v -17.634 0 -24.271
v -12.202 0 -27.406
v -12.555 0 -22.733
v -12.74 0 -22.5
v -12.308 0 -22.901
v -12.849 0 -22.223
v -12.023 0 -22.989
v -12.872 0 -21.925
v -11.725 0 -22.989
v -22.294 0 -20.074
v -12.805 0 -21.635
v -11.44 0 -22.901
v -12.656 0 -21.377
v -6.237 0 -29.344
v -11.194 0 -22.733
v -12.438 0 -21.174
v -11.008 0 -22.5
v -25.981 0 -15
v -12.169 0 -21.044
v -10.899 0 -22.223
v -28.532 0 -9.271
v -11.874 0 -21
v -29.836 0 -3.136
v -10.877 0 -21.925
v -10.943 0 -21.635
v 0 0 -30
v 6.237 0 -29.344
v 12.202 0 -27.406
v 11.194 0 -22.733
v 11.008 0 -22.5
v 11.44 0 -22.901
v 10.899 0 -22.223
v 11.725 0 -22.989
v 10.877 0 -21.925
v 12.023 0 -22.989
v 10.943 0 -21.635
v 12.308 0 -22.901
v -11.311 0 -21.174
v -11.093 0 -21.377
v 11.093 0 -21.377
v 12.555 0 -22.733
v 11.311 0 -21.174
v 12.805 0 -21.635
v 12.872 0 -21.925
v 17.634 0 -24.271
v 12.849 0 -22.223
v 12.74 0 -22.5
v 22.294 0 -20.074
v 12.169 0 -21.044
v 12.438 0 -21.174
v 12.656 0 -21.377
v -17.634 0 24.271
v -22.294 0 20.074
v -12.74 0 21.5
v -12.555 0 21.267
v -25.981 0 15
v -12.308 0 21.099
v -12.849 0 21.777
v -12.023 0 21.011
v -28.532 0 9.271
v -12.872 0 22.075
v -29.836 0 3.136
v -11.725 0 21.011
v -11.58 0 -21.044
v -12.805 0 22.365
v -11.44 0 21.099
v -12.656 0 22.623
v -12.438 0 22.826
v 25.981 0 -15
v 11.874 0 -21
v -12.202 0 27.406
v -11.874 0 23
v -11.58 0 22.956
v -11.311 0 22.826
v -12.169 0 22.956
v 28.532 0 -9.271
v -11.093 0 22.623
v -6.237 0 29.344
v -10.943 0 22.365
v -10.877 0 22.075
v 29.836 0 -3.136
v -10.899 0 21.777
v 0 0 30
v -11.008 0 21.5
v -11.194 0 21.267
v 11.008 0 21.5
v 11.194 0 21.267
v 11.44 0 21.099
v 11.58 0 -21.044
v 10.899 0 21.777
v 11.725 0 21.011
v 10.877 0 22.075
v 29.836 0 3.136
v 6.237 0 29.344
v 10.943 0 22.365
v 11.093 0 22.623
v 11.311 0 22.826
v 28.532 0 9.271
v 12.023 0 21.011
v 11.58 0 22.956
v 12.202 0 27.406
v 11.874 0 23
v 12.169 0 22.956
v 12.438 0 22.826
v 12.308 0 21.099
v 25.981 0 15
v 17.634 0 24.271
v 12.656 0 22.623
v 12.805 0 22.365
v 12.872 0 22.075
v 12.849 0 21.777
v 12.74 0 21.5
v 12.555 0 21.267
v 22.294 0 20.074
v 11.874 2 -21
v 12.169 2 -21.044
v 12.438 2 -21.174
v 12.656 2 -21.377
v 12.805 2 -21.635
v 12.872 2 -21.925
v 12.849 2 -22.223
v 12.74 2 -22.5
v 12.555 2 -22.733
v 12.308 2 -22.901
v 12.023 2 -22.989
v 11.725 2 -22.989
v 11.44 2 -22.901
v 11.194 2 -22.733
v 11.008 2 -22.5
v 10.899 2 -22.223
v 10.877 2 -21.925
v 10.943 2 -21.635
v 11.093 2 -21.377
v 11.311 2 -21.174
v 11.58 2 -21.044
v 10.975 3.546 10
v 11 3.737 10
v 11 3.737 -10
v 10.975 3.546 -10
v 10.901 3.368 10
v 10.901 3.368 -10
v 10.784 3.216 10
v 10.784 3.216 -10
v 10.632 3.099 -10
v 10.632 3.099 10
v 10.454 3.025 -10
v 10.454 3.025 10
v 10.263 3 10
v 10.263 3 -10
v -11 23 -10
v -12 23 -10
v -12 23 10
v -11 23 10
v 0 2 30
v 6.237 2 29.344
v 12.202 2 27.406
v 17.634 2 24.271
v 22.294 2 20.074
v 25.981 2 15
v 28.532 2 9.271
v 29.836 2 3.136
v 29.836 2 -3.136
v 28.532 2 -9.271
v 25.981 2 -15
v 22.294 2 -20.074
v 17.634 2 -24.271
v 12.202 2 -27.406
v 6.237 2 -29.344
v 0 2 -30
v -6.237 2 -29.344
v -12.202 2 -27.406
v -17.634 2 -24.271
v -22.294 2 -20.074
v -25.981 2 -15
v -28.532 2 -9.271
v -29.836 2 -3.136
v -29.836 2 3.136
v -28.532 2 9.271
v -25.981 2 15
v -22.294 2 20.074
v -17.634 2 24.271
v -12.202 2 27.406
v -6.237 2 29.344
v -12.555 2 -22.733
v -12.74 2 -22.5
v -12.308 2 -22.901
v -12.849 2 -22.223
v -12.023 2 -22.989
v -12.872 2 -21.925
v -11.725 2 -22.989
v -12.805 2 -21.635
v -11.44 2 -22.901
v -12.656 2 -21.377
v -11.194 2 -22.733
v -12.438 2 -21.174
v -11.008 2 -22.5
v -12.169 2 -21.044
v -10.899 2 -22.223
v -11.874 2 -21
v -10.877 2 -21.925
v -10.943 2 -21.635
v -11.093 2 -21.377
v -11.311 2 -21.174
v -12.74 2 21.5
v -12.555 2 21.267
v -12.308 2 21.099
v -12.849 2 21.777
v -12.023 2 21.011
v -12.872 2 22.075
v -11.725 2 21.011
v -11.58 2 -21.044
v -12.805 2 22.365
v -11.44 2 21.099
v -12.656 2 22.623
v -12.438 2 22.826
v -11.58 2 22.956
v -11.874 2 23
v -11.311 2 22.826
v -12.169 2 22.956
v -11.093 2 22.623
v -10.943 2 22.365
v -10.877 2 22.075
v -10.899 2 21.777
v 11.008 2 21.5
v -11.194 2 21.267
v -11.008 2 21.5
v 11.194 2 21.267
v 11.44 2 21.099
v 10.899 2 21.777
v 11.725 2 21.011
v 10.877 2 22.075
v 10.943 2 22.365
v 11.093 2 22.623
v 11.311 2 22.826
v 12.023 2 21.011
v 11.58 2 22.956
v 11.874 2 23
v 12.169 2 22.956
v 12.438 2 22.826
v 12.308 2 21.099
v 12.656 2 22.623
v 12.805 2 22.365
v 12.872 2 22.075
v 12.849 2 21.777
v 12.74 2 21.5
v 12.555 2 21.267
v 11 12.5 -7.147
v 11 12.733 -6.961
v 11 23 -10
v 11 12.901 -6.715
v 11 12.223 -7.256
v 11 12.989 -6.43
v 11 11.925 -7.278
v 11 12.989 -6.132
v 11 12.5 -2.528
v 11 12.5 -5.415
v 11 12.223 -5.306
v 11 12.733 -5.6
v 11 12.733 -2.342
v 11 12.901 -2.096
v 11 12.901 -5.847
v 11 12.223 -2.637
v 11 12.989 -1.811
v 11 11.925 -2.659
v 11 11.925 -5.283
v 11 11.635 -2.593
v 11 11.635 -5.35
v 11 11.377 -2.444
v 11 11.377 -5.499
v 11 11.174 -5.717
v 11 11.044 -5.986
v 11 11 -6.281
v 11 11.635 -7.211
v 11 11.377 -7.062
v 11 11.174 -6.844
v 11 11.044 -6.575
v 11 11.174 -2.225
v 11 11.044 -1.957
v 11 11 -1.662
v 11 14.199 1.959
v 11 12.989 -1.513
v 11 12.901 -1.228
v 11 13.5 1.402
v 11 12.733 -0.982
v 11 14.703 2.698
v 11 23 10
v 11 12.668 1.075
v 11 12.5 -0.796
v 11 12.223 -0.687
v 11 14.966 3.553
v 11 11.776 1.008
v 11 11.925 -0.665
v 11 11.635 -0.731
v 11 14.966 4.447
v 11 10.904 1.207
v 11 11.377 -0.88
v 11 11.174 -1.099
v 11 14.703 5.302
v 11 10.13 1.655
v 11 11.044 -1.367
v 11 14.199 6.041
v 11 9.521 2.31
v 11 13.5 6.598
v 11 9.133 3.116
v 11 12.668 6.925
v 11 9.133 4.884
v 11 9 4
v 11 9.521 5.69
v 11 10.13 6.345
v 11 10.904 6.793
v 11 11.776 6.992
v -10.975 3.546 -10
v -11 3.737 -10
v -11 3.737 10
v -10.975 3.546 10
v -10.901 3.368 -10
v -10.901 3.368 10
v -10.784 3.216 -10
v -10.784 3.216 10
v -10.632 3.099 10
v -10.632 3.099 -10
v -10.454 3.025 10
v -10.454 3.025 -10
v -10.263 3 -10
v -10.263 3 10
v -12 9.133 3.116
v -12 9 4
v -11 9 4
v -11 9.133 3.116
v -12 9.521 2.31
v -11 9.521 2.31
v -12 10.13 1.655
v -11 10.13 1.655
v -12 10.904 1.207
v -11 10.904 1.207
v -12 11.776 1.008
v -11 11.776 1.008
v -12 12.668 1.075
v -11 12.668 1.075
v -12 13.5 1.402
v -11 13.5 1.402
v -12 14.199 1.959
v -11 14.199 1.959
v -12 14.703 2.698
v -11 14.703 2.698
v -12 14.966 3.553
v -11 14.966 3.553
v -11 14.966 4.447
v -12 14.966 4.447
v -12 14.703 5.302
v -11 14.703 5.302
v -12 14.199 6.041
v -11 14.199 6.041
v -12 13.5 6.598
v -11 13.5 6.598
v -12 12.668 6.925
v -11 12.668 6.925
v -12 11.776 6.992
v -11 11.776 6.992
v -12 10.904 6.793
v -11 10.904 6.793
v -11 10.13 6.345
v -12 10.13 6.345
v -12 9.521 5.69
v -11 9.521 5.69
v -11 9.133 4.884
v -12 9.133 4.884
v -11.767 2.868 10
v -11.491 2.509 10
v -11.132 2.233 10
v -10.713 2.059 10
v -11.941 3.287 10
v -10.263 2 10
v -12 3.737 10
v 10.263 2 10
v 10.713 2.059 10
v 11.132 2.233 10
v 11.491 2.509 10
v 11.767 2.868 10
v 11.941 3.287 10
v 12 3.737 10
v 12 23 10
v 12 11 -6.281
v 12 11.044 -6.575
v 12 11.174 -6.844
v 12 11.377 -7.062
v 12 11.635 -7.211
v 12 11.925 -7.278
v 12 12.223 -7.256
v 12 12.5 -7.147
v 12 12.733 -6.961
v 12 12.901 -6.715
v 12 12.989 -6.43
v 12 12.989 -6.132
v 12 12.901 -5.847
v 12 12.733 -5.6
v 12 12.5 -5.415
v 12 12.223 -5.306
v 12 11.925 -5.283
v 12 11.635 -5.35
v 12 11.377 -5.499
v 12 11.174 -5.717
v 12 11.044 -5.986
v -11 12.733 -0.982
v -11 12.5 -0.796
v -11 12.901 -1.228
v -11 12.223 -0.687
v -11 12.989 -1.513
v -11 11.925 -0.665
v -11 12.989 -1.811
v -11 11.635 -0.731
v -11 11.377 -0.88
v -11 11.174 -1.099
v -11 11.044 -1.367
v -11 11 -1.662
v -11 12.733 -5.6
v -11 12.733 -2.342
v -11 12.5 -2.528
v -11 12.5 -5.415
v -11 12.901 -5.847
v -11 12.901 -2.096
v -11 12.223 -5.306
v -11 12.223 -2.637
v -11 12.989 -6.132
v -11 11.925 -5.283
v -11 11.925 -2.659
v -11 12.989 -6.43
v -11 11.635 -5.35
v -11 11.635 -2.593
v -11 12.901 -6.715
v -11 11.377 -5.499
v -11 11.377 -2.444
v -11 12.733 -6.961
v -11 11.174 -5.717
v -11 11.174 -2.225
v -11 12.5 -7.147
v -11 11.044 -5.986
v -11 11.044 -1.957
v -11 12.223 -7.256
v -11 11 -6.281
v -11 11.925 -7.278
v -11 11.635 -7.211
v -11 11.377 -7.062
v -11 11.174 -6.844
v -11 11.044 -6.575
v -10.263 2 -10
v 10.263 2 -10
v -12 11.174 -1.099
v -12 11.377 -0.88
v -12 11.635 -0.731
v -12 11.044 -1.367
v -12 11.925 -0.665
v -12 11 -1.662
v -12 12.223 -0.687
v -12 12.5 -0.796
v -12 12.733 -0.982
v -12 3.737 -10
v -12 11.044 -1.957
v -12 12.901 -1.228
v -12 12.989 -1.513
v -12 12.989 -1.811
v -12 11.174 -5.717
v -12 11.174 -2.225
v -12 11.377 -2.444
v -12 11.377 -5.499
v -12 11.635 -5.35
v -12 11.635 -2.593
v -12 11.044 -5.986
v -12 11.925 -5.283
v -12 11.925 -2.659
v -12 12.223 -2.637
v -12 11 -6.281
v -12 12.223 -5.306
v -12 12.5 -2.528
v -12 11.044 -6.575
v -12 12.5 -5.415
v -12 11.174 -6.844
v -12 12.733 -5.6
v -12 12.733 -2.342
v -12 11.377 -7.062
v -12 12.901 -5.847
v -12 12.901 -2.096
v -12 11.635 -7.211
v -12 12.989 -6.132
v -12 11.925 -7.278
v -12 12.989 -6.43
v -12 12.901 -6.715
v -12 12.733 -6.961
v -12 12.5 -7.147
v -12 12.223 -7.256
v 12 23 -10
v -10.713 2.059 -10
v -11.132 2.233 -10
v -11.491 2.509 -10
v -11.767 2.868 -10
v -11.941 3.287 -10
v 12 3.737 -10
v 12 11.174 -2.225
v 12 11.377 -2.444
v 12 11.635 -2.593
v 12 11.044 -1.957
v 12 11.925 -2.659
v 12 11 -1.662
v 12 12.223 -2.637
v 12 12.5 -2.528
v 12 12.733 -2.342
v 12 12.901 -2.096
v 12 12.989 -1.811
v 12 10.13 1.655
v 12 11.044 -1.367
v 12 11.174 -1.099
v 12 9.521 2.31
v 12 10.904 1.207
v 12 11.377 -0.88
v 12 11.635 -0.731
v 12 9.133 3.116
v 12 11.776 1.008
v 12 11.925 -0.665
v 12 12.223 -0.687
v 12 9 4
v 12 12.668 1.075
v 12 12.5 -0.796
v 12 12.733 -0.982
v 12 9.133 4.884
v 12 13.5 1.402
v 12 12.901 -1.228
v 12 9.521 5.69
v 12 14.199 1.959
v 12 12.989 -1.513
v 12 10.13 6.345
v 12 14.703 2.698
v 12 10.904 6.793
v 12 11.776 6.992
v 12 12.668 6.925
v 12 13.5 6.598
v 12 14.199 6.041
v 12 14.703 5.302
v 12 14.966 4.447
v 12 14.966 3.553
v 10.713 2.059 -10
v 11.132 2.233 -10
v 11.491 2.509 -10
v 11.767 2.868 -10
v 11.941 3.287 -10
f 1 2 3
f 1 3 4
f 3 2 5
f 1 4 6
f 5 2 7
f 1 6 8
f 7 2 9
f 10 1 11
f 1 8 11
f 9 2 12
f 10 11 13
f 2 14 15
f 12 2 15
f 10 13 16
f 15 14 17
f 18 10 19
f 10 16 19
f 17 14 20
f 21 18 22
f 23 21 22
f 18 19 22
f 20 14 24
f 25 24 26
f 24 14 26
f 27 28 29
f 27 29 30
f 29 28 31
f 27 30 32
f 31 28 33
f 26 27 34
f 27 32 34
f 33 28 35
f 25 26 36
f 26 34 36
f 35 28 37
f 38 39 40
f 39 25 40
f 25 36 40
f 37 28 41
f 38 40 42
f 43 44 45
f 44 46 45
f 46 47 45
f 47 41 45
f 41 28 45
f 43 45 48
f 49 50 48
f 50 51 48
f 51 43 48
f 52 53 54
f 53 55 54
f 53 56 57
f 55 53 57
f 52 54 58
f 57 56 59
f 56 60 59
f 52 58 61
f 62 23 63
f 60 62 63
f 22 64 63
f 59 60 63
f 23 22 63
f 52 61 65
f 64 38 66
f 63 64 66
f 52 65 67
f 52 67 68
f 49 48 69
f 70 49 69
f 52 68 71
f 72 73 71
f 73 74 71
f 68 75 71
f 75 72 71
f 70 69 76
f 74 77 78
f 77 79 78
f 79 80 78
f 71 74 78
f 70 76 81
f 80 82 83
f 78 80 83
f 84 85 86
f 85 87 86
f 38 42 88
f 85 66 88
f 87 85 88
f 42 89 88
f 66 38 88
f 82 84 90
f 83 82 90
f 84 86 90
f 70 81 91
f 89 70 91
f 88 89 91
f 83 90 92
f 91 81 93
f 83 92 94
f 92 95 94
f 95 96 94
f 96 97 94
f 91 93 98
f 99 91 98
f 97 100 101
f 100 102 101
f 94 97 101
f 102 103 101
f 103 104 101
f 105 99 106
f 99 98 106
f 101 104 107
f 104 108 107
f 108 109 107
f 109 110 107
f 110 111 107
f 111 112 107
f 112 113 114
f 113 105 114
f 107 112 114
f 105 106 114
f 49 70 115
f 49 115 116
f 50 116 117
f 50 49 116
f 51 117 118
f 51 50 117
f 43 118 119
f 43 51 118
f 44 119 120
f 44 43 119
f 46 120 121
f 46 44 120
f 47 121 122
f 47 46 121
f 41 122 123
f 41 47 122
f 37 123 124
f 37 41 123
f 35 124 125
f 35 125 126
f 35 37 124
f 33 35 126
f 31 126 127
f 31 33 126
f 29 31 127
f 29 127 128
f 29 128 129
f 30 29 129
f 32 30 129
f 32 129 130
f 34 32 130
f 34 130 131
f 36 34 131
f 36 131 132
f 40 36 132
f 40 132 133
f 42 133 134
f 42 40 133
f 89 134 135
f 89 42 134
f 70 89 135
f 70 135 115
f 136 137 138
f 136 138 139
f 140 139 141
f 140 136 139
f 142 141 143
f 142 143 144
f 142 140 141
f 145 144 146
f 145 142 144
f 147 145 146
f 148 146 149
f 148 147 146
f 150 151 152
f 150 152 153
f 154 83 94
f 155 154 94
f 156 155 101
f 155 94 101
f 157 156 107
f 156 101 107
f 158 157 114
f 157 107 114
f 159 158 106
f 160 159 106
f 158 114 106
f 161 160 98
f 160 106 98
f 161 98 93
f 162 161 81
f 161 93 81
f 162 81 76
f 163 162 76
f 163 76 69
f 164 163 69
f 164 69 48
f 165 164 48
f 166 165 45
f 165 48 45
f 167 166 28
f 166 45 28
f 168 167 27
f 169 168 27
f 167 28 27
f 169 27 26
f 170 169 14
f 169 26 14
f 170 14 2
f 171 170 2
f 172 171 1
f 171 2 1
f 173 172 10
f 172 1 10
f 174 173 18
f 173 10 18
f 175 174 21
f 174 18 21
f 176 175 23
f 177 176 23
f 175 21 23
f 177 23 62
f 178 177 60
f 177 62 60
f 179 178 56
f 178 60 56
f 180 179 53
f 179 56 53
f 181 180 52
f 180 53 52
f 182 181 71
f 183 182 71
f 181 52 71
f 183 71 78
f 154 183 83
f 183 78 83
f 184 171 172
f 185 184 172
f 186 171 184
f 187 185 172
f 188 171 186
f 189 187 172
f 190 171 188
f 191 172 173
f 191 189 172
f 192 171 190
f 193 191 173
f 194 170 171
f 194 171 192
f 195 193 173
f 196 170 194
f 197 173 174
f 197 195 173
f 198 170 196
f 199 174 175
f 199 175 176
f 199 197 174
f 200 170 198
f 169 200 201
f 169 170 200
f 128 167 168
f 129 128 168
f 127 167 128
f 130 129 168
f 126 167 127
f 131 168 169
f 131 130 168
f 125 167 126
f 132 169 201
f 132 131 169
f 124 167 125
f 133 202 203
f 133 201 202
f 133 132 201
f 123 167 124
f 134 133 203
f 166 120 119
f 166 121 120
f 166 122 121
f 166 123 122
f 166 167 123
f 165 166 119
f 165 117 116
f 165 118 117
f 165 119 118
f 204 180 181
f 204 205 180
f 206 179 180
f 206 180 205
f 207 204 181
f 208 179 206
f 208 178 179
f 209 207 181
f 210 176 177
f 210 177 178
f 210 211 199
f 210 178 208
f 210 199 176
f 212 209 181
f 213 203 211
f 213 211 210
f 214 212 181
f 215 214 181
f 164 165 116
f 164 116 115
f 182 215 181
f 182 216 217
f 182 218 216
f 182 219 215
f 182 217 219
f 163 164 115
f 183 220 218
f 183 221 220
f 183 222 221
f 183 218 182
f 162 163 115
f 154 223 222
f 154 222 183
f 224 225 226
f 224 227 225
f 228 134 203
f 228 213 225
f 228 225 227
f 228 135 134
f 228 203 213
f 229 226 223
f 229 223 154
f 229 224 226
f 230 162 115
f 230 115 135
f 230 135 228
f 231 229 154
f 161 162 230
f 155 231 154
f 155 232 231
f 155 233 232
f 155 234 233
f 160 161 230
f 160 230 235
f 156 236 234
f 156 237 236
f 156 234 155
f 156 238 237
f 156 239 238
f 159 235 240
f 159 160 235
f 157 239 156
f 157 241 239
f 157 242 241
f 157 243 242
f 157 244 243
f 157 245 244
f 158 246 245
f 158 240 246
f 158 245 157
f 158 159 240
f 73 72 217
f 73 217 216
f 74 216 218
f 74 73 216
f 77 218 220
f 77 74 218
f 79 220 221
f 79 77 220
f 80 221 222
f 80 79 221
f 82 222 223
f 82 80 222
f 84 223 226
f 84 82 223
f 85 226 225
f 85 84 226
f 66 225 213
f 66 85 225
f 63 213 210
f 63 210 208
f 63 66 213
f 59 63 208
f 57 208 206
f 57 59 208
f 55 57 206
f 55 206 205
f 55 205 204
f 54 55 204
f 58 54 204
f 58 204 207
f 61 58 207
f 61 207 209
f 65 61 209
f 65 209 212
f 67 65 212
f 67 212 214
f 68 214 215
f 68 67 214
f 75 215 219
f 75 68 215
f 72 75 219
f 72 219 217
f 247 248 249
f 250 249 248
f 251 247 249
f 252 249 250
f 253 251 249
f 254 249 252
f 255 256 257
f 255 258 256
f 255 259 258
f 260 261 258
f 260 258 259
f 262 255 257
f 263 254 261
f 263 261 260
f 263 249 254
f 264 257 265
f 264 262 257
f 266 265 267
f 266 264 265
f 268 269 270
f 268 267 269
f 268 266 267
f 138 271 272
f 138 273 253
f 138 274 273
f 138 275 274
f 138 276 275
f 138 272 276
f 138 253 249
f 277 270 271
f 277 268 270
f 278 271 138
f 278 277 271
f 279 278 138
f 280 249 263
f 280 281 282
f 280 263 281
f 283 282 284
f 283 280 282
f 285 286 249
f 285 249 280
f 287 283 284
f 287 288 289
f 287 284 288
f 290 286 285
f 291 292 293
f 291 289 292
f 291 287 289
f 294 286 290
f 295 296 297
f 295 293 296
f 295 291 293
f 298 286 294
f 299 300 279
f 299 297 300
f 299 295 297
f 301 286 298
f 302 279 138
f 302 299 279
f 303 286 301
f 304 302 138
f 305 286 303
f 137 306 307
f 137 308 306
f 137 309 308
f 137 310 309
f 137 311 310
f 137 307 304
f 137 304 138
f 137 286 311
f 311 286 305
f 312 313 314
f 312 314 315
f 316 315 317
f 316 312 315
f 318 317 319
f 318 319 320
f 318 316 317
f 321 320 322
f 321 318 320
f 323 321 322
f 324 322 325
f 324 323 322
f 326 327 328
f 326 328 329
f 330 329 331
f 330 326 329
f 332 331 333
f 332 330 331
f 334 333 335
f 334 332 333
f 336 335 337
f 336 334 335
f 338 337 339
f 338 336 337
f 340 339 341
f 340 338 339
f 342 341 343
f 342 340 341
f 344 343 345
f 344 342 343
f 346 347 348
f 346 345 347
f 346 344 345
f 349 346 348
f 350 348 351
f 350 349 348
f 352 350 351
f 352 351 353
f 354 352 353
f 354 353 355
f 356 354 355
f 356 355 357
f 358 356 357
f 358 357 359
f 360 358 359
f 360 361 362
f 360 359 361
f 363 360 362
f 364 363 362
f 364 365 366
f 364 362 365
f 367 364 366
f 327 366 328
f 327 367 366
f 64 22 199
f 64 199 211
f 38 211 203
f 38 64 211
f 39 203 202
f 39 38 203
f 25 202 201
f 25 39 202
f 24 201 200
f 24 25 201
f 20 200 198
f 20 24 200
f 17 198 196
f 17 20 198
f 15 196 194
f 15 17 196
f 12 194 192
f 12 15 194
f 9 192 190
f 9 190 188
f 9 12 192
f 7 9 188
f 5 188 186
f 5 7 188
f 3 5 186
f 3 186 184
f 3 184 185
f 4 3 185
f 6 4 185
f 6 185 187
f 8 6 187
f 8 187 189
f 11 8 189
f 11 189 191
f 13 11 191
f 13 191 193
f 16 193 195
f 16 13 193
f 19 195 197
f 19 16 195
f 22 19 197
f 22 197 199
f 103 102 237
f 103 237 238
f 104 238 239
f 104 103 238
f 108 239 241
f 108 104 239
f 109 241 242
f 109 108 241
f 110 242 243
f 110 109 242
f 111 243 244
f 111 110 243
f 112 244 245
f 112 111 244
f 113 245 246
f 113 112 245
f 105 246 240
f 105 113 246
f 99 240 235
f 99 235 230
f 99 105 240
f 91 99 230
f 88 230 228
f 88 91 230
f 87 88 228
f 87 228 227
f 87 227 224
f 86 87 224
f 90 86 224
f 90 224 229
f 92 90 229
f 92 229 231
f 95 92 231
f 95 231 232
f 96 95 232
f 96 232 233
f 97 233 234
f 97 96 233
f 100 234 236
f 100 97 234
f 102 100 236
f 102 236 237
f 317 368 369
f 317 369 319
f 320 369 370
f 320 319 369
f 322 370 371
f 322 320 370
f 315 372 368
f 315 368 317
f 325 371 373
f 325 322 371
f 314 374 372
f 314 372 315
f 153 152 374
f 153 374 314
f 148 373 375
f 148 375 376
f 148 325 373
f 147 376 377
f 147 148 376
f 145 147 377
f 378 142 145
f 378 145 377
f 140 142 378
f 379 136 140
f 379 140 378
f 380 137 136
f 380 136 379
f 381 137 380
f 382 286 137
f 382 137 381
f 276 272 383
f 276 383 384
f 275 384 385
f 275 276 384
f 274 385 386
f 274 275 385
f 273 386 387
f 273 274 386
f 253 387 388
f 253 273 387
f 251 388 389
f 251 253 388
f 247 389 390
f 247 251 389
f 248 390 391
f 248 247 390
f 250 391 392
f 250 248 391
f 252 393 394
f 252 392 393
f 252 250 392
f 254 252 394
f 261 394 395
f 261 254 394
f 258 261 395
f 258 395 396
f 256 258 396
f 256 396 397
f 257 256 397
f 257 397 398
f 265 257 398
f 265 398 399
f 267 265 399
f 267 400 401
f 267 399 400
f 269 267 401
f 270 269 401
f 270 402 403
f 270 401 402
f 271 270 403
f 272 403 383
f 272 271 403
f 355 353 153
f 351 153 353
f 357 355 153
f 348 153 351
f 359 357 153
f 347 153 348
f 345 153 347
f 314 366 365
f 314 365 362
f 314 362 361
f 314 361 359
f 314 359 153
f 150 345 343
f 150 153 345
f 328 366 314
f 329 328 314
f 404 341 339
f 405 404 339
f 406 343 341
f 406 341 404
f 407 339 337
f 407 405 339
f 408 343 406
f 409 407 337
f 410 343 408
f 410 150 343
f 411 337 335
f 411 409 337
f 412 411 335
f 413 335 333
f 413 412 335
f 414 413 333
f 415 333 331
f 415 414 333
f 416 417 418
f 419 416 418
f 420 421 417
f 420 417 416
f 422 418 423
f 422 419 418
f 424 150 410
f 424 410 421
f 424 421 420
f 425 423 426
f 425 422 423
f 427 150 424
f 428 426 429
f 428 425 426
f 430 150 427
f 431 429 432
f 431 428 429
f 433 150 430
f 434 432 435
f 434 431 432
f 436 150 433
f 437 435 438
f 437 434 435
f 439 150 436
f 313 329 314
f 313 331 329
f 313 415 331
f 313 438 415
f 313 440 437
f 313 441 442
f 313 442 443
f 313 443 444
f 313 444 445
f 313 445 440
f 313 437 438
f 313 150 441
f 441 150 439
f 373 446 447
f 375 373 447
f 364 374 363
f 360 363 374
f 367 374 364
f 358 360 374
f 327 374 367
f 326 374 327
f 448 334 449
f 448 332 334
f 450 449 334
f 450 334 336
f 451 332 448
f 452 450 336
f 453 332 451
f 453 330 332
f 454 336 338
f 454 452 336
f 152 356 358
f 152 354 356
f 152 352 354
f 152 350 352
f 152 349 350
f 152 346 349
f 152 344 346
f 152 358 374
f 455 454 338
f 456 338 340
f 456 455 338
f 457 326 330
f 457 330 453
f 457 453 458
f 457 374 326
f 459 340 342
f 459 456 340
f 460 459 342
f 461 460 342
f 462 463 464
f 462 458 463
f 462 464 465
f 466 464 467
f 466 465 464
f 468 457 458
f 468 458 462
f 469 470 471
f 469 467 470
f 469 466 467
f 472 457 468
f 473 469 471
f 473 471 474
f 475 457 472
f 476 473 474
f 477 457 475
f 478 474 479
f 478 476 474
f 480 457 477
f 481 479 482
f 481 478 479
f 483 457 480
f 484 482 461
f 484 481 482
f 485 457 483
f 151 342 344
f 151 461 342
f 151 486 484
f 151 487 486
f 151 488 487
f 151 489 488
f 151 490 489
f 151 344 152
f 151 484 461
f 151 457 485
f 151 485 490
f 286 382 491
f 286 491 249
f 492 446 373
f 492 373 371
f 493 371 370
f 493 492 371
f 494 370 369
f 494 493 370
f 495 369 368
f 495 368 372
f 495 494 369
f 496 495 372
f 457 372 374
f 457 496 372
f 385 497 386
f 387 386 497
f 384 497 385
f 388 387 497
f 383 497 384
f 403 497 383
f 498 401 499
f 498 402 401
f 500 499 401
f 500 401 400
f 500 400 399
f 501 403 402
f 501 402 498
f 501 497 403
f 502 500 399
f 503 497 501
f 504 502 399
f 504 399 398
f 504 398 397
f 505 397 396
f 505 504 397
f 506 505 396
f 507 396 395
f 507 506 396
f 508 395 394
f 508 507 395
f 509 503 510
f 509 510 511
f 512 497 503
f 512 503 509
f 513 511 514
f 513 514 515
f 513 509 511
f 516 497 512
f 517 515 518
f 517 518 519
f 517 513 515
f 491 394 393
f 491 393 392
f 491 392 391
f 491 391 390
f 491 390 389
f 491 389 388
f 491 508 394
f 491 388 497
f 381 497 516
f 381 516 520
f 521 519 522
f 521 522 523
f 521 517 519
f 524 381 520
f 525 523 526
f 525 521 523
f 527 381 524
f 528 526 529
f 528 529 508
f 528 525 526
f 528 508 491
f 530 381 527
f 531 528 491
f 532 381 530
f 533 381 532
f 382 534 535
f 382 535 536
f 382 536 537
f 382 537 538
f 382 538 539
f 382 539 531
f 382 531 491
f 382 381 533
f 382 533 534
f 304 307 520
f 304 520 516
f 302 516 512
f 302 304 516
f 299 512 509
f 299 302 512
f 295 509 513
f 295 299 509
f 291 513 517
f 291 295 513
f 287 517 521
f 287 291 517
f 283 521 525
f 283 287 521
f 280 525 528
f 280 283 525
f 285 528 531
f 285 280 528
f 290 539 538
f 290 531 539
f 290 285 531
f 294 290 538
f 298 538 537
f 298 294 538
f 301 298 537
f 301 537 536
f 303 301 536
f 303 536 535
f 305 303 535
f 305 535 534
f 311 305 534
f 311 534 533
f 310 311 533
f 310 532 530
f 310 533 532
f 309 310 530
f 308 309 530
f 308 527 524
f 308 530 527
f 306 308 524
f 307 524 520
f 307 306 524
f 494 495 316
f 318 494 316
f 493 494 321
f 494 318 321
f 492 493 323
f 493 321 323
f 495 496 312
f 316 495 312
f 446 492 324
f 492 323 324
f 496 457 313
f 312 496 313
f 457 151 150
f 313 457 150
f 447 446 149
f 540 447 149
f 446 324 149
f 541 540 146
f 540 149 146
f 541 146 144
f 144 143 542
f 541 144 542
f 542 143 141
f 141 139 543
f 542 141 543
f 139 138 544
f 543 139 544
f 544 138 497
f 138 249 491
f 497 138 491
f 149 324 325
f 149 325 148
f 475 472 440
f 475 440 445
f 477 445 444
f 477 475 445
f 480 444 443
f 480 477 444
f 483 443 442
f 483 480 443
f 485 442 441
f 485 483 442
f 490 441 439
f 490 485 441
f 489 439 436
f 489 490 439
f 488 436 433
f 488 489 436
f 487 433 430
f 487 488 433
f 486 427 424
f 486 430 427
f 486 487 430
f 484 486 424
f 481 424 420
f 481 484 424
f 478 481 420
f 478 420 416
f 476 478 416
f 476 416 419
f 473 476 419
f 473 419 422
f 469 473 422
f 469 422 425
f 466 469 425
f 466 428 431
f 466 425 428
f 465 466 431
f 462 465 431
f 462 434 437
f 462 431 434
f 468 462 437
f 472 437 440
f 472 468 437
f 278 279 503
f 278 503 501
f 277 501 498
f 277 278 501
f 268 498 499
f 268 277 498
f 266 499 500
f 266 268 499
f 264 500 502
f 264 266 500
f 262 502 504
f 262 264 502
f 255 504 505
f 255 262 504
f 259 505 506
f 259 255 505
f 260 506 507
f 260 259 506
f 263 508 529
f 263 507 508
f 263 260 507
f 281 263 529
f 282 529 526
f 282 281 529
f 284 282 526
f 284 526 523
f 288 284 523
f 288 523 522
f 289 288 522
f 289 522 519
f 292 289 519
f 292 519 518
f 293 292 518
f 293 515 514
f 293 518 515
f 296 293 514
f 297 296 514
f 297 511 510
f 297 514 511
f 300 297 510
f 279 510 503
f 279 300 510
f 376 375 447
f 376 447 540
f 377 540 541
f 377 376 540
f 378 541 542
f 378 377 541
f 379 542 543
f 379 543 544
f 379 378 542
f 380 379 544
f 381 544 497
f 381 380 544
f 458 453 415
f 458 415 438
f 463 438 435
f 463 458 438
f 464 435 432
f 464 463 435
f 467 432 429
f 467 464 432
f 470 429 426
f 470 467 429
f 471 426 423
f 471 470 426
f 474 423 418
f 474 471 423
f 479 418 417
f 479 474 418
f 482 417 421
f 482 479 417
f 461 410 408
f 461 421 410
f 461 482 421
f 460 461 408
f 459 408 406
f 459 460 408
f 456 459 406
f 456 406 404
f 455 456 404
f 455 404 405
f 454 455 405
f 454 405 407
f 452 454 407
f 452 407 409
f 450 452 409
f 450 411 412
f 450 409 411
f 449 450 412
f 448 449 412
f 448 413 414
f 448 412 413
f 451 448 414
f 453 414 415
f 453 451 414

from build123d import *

# Parameters (mm, degrees)
SKETCH3_R                      = 30
SKETCH3_R_2                    = 1
BOSS_EXTRUDE1_DEPTH            = 2
SKETCH4_W                      = 22
SKETCH4_H                      = 20
BASE_FLANGE1_DEPTH             = 1
EDGE_FLANGE1_STRIP_W           = 5.4732
EDGE_FLANGE1_STRIP_H           = 1
EDGE_FLANGE1_STRIP_CUT_DEPTH   = 20
EDGE_FLANGE1_STRIP_2_W         = 5.4732
EDGE_FLANGE1_STRIP_2_H         = 1
EDGE_FLANGE1_STRIP_CUT_2_DEPTH = 20
EDGE_FLANGE1_DEPTH             = 20
EDGE_FLANGE1_BEND_DEPTH        = 20
CUT_EXTRUDE1_DEPTH             = 49.259714048
CUT_EXTRUDE1_DEPTH_BACK        = 49.259714048
SKETCH17_R                     = 3
SKETCH17_R_2                   = 1


# Sheet-metal steps are written as plain solids
with BuildPart() as part:
    # Sketch3 → Boss-Extrude1 (new body)
    with BuildSketch(Plane(origin=(0, 0, 0), x_dir=(1, 0, 0), z_dir=(0, 1, 0))):
        with Locations(Location((0, 0, 0), (0, 0, 270))):
            Circle(SKETCH3_R)
        with Locations(Location((-11.874342087, 22, 0), (0, 0, 270))):
            Circle(SKETCH3_R_2, mode=Mode.SUBTRACT)
        with Locations(Location((11.874342087, 22, 0), (0, 0, 270))):
            Circle(SKETCH3_R_2, mode=Mode.SUBTRACT)
        with Locations(Location((11.874342087, -22, 0), (0, 0, 270))):
            Circle(SKETCH3_R_2, mode=Mode.SUBTRACT)
        with Locations(Location((-11.874342087, -22, 0), (0, 0, 270))):
            Circle(SKETCH3_R_2, mode=Mode.SUBTRACT)
    extrude(amount=BOSS_EXTRUDE1_DEPTH)


with BuildPart() as body_2:
    # Sketch4 → Base-Flange1 (new body)
    with BuildSketch(Plane(origin=(0, 2, 0), x_dir=(1, 0, 0), z_dir=(0, 1, 0))):
        Rectangle(SKETCH4_W, SKETCH4_H)
    extrude(amount=BASE_FLANGE1_DEPTH)

    # Edge-Flange1 strip (across the edge) → Edge-Flange1 strip cut (cut)
    with BuildSketch(Plane(origin=(-11, 3, -10), x_dir=(1, 0, 0), z_dir=(0, 0, 1))):
        with Locations((-2, -0.5)):
            Rectangle(EDGE_FLANGE1_STRIP_W, EDGE_FLANGE1_STRIP_H)
    extrude(amount=EDGE_FLANGE1_STRIP_CUT_DEPTH, mode=Mode.SUBTRACT)

    # Edge-Flange1 strip 2 (across the edge) → Edge-Flange1 strip cut 2 (cut)
    with BuildSketch(Plane(origin=(11, 3, 10), x_dir=(-1, 0, 0), z_dir=(0, 0, -1))):
        with Locations((-2, -0.5)):
            Rectangle(EDGE_FLANGE1_STRIP_2_W, EDGE_FLANGE1_STRIP_2_H)
    extrude(amount=EDGE_FLANGE1_STRIP_CUT_2_DEPTH, mode=Mode.SUBTRACT)

    # Edge-Flange1 section (across the edge) → Edge-Flange1 (add)
    with BuildSketch(Plane(origin=(-11, 3, -10), x_dir=(1, 0, 0), z_dir=(0, 0, 1))):
        with BuildLine():
            Line((-1, 0.7366), (-1, 20))
            Line((-1, 20), (0, 20))
            Line((0, 20), (0, 0.7366))
            ThreePointArc((0, 0.7366), (0.215745145, 0.215745145), (0.7366, 0))
            Line((0.7366, 0), (0.7366, -1))
            ThreePointArc((0.7366, -1), (-0.491361636, -0.491361636), (-1, 0.7366))
        make_face()
    extrude(amount=EDGE_FLANGE1_DEPTH)

    # Edge-Flange1 section 2 (across the edge) → Edge-Flange1 bend (add)
    with BuildSketch(Plane(origin=(11, 3, 10), x_dir=(-1, 0, 0), z_dir=(0, 0, -1))):
        with BuildLine():
            Line((-1, 0.7366), (-1, 20))
            Line((-1, 20), (0, 20))
            Line((0, 20), (0, 0.7366))
            ThreePointArc((0, 0.7366), (0.215745145, 0.215745145), (0.7366, 0))
            Line((0.7366, 0), (0.7366, -1))
            ThreePointArc((0.7366, -1), (-0.491361636, -0.491361636), (-1, 0.7366))
        make_face()
    extrude(amount=EDGE_FLANGE1_BEND_DEPTH)

    # Sketch17 → Cut-Extrude1 (cut, two sides: drawn at the far end of the back side and taken through both)
    with BuildSketch(Plane(origin=(0, 0, 0), x_dir=(0, 0, -1), z_dir=(1, 0, 0)).offset(-CUT_EXTRUDE1_DEPTH_BACK)):
        with Locations(Location((-4, 12, 0), (0, 0, 270))):
            Circle(SKETCH17_R)
        with Locations(Location((1.662167446, 12, 0), (0, 0, 270))):
            Circle(SKETCH17_R_2)
        with Locations(Location((6.280617318, 12, 0), (0, 0, 270))):
            Circle(SKETCH17_R_2)
    extrude(amount=CUT_EXTRUDE1_DEPTH + CUT_EXTRUDE1_DEPTH_BACK, mode=Mode.SUBTRACT)


solid = Compound([part.part, body_2.part])
